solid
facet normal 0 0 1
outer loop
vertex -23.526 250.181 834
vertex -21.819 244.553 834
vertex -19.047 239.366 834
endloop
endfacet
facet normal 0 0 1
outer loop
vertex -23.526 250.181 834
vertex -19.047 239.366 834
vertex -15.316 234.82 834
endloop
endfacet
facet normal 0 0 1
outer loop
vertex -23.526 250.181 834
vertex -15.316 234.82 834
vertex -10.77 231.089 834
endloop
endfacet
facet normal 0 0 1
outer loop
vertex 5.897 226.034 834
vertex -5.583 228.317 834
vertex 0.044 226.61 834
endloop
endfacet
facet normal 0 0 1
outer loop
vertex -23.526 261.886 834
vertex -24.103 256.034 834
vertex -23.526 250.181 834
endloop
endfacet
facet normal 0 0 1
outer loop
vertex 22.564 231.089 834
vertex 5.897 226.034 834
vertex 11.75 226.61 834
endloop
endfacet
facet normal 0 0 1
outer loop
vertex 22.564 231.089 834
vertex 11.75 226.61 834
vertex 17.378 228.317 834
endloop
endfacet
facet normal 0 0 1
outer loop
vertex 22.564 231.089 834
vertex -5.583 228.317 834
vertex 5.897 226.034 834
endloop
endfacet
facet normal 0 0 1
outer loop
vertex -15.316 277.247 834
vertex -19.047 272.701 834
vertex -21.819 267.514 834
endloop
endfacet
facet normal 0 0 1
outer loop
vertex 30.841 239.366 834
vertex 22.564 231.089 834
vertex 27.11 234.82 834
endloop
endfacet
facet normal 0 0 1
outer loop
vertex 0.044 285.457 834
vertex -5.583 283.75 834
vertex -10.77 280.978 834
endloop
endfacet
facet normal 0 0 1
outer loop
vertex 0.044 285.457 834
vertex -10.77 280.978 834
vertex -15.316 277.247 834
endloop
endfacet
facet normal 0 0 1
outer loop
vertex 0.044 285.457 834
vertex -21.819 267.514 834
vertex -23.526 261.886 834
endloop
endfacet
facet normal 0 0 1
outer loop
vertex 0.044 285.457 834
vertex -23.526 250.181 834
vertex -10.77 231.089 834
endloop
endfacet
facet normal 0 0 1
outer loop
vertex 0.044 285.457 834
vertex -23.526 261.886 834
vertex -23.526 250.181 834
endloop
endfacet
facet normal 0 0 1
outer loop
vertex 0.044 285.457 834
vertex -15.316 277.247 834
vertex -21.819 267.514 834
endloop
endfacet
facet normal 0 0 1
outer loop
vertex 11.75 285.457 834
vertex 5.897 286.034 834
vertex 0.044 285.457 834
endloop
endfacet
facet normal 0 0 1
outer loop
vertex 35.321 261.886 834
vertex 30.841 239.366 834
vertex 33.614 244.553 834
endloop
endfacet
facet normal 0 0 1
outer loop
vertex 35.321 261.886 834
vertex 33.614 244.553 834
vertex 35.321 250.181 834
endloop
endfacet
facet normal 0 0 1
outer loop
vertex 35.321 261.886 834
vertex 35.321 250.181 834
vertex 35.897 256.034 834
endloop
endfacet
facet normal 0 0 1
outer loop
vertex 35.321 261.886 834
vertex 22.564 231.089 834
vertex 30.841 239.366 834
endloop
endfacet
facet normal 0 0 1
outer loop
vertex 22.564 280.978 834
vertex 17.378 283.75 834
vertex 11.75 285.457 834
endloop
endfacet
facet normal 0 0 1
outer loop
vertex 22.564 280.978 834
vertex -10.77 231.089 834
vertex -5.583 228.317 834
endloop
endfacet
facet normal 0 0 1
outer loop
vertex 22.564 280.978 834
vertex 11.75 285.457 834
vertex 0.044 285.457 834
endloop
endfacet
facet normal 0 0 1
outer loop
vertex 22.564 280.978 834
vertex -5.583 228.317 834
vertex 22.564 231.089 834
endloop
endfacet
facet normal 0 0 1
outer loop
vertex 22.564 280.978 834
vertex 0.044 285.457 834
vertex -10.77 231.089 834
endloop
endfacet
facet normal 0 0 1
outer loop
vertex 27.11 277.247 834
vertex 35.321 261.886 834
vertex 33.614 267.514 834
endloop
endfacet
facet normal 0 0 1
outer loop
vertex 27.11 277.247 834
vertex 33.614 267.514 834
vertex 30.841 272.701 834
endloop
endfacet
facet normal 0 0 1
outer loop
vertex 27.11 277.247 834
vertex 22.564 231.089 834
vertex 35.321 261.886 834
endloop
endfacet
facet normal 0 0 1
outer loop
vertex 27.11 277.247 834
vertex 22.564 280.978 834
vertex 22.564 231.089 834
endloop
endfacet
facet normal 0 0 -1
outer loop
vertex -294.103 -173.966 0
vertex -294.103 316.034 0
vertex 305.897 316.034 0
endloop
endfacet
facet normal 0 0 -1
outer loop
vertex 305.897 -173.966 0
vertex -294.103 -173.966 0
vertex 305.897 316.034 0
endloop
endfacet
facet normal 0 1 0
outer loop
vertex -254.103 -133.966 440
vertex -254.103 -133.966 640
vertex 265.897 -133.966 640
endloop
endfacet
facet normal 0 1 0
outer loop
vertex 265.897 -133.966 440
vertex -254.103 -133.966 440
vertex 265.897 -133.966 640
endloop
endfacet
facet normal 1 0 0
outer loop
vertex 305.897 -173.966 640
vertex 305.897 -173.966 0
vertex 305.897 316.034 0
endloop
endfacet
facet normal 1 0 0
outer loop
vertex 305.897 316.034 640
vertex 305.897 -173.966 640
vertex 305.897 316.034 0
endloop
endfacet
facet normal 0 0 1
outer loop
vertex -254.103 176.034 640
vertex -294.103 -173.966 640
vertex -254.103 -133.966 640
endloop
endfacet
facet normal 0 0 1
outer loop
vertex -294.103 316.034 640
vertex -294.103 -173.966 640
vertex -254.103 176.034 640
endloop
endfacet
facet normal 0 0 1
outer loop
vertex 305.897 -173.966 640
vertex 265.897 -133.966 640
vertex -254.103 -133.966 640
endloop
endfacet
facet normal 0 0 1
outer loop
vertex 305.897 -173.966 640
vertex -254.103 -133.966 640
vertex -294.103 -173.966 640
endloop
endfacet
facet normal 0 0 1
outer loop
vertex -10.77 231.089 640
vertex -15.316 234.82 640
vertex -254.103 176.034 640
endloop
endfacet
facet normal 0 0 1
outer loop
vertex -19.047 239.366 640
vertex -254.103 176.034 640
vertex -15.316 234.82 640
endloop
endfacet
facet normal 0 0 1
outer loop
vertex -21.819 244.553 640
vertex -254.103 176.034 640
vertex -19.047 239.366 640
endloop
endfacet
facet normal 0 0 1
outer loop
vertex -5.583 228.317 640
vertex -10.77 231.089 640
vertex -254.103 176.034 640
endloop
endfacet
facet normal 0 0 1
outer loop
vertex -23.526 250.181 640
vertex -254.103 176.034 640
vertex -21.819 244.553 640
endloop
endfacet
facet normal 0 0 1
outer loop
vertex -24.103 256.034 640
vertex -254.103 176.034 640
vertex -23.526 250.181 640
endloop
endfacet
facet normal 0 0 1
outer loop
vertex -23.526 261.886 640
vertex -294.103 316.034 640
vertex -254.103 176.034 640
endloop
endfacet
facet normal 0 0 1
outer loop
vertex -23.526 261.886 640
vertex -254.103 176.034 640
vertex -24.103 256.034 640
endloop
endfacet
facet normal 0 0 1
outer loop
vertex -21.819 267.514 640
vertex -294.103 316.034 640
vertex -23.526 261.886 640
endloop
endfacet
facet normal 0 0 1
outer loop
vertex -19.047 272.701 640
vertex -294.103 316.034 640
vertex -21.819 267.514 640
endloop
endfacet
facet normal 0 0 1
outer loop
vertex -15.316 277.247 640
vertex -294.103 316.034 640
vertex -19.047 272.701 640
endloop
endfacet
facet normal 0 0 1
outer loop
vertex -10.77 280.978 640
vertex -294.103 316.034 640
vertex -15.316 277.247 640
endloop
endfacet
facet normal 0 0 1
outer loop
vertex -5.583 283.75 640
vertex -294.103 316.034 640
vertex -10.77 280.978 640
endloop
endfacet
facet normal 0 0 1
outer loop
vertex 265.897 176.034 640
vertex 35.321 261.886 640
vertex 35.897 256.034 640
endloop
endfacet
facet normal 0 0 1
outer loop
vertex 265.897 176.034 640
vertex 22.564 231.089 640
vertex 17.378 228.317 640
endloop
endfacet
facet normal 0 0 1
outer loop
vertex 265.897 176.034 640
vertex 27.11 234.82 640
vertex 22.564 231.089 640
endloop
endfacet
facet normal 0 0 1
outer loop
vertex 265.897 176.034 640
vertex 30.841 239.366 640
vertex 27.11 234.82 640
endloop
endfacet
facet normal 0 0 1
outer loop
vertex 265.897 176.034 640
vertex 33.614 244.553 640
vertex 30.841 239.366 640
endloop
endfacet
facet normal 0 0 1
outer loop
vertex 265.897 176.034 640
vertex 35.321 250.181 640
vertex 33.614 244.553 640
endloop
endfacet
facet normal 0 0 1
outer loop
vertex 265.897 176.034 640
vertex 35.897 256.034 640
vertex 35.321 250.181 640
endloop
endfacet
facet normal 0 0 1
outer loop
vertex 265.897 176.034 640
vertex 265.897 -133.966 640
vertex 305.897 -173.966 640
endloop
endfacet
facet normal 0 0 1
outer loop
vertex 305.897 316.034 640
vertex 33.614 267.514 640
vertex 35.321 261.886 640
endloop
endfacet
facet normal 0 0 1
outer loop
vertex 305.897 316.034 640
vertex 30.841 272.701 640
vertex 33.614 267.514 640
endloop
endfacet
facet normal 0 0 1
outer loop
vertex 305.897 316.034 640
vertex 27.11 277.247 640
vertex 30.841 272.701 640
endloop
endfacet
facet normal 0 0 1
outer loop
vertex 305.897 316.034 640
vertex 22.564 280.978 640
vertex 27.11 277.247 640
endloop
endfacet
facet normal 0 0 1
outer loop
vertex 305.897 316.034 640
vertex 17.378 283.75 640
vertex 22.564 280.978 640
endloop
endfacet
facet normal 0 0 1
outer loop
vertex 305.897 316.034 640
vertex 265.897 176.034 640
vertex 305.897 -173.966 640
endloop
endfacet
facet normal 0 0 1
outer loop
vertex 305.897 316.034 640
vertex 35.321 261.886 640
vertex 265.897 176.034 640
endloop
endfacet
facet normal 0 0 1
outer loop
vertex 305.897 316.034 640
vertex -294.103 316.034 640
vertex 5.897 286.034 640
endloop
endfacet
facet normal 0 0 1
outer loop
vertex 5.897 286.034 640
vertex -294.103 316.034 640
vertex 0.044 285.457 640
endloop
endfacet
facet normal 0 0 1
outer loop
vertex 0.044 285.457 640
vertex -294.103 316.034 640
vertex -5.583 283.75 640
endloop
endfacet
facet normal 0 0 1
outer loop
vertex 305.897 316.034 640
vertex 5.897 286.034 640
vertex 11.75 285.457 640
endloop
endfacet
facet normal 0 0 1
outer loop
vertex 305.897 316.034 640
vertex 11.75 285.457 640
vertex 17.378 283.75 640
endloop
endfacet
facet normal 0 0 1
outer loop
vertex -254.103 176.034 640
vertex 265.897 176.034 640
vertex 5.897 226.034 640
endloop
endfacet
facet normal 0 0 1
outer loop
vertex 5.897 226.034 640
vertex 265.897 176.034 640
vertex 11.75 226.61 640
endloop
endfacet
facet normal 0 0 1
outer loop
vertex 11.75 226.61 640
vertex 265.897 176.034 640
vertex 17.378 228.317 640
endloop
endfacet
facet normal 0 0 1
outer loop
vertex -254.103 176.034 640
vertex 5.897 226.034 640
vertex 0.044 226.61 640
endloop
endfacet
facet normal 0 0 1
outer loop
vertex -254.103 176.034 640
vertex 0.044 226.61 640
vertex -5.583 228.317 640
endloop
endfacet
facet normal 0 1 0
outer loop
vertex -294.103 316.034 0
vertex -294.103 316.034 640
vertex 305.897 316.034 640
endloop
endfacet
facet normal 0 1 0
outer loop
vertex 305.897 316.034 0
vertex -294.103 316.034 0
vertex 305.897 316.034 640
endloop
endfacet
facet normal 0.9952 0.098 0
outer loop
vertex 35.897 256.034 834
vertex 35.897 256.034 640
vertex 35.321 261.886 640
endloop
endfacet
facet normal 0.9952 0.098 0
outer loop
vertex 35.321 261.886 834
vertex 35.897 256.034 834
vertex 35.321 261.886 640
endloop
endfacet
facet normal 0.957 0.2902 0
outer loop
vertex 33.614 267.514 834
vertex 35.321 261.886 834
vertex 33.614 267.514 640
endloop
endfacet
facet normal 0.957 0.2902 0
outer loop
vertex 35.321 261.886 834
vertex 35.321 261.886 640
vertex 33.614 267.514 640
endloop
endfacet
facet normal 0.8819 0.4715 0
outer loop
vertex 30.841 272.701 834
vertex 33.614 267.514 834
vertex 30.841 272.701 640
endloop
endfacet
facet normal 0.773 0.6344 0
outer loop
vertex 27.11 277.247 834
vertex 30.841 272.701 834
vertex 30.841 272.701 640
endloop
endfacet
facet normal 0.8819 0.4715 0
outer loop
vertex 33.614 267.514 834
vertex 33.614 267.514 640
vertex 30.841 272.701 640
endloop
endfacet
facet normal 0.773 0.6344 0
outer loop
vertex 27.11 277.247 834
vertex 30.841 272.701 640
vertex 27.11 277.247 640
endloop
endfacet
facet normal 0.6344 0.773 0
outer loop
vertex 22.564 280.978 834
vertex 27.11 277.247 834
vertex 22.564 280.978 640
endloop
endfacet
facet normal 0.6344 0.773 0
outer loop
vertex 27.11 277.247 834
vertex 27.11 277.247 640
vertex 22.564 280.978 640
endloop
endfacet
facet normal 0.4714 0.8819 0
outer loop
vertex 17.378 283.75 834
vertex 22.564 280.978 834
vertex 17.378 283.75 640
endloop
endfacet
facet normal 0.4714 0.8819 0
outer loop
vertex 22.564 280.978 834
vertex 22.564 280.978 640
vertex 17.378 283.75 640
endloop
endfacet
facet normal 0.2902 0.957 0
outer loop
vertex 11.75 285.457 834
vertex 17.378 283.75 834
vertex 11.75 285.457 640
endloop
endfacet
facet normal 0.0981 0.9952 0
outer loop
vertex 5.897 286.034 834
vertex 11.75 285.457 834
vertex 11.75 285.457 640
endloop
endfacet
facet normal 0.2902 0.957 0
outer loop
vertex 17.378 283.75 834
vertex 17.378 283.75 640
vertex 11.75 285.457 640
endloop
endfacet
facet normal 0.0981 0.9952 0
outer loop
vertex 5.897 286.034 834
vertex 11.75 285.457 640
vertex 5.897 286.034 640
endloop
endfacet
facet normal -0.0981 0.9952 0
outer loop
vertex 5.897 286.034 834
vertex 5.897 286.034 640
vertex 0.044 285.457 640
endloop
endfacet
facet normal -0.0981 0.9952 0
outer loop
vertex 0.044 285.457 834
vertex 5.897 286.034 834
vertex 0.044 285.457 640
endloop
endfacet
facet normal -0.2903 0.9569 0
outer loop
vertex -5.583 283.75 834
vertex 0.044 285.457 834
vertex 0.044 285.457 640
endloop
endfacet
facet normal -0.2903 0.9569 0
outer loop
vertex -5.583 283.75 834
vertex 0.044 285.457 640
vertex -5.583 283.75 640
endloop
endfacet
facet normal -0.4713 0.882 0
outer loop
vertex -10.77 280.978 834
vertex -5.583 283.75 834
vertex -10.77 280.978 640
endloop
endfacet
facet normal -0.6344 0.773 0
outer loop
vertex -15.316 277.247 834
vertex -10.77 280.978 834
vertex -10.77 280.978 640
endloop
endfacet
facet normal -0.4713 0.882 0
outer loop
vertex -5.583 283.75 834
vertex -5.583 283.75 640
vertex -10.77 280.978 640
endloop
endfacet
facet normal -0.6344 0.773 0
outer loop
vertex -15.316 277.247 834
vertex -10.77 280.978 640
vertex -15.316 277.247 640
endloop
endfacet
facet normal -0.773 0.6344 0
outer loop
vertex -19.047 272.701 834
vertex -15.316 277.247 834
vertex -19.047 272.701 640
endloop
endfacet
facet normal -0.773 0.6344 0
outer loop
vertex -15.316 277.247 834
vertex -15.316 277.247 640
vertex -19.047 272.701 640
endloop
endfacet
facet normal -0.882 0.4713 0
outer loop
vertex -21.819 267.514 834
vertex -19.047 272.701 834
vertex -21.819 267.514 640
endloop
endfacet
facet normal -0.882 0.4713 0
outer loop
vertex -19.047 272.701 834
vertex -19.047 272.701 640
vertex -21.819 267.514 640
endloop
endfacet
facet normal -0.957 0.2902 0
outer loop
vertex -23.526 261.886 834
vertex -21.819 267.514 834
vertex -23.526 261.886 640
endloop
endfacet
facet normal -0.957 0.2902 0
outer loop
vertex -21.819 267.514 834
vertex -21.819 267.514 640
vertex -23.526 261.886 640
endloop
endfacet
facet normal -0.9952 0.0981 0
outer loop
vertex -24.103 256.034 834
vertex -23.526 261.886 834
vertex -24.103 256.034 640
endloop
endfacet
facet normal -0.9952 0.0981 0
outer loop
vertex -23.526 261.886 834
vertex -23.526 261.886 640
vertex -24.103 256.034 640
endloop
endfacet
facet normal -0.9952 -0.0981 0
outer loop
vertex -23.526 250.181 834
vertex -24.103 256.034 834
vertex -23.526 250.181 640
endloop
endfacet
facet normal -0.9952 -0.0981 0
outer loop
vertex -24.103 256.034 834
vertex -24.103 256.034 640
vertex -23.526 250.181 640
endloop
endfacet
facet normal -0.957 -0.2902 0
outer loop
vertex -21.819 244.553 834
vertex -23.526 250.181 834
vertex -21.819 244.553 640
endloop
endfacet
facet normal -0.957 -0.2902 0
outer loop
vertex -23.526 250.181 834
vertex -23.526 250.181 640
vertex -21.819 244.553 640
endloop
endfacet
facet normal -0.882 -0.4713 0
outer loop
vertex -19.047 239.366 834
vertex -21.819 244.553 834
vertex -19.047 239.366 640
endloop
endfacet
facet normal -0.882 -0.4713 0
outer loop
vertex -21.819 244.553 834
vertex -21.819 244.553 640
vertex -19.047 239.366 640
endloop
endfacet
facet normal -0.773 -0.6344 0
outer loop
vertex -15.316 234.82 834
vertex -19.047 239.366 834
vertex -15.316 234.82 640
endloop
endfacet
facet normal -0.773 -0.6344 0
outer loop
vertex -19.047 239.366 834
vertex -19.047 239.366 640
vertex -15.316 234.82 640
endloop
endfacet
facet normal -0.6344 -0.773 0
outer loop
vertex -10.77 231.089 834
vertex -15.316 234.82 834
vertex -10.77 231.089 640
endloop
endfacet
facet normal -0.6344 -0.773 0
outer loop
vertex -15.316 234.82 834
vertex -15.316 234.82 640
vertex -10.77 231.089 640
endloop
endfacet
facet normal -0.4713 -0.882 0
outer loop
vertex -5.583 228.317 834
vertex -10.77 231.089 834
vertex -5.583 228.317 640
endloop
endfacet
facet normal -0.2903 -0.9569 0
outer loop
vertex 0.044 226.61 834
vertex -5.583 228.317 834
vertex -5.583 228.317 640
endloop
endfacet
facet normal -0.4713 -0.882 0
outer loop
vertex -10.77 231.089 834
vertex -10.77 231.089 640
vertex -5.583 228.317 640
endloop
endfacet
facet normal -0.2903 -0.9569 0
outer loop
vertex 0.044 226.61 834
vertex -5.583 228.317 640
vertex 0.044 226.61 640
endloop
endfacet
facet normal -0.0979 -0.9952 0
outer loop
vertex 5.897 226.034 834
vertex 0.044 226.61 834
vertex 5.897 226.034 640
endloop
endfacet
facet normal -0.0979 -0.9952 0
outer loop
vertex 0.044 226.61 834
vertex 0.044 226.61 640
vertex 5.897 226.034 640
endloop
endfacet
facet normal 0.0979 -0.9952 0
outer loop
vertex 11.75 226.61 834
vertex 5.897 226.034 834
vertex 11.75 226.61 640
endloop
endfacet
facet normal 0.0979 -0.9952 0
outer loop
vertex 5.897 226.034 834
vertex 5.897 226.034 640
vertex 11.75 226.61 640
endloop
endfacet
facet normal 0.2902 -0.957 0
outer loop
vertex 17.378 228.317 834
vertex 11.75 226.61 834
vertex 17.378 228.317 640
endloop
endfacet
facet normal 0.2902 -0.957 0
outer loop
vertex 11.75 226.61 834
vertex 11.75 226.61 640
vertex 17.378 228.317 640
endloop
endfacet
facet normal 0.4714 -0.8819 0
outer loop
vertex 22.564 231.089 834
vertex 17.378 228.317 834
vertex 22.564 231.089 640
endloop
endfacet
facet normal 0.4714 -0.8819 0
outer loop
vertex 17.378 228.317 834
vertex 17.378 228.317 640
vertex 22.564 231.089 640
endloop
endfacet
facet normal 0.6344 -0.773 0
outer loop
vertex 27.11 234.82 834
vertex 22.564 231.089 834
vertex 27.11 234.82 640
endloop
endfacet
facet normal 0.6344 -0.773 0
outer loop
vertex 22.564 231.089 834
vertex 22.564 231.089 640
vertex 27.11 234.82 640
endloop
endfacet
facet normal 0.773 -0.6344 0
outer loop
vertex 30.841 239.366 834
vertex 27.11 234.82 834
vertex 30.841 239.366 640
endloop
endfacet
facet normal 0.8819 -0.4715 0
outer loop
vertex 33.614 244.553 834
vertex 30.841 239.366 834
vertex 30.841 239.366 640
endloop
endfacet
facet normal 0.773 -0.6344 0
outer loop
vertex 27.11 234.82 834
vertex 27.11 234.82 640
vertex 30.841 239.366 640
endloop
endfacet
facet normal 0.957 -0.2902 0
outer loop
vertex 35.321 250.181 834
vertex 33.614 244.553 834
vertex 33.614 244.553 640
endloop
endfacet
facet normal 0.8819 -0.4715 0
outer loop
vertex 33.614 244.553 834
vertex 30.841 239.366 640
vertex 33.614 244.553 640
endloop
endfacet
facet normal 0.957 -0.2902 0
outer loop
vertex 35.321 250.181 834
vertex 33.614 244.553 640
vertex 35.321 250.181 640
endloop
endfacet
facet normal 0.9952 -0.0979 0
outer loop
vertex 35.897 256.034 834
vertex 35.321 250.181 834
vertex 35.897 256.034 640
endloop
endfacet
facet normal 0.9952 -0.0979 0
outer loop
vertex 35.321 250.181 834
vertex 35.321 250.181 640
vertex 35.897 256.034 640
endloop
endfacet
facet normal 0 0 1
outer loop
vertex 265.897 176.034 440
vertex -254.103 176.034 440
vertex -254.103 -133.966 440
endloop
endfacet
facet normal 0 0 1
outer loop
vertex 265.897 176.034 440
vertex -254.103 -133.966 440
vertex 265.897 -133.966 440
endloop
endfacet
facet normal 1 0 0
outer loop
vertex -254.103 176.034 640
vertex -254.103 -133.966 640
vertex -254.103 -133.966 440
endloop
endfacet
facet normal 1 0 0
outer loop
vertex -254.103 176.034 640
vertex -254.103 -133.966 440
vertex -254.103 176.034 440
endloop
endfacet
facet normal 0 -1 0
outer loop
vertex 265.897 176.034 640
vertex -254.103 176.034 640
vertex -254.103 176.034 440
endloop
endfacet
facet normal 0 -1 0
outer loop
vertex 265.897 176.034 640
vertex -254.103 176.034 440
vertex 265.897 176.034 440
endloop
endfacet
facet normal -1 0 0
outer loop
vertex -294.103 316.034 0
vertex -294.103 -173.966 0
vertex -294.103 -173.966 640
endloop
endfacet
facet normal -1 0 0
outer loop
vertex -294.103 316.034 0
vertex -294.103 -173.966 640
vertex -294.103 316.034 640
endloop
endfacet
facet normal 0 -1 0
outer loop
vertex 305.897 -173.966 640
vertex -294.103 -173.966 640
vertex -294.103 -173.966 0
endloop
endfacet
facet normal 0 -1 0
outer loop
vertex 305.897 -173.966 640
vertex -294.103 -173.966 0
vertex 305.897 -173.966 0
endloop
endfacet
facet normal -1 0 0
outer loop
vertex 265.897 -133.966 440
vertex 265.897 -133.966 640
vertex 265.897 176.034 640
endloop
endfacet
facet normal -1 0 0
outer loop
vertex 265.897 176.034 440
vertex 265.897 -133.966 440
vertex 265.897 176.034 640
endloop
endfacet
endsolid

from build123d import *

# Parameters (mm, degrees)
F0_W     = 600
F0_H     = 490
F1_DEPTH = 640
F2_W     = 520
F2_H     = 310
F3_DEPTH = 200
F4_R     = 30
F5_DEPTH = 194


with BuildPart() as f1:
    # F0 (on Top) → F1 (new body)
    with BuildSketch(Plane.XY):
        with Locations((5.897177, 71.033585)):
            Rectangle(F0_W, F0_H)
    extrude(amount=F1_DEPTH)

    # F2 (on face) → F3 (cut)
    with BuildSketch(Plane.XY.offset(640)):
        with Locations((5.897177, 21.033585)):
            Rectangle(F2_W, F2_H)
    extrude(amount=-F3_DEPTH, mode=Mode.SUBTRACT)

    # F4 (on face) → F5 (join)
    with BuildSketch(Plane.XY.offset(640)):
        with Locations((5.897177, 256.033585)):
            Circle(F4_R)
    extrude(amount=F5_DEPTH)


solid = f1.part
